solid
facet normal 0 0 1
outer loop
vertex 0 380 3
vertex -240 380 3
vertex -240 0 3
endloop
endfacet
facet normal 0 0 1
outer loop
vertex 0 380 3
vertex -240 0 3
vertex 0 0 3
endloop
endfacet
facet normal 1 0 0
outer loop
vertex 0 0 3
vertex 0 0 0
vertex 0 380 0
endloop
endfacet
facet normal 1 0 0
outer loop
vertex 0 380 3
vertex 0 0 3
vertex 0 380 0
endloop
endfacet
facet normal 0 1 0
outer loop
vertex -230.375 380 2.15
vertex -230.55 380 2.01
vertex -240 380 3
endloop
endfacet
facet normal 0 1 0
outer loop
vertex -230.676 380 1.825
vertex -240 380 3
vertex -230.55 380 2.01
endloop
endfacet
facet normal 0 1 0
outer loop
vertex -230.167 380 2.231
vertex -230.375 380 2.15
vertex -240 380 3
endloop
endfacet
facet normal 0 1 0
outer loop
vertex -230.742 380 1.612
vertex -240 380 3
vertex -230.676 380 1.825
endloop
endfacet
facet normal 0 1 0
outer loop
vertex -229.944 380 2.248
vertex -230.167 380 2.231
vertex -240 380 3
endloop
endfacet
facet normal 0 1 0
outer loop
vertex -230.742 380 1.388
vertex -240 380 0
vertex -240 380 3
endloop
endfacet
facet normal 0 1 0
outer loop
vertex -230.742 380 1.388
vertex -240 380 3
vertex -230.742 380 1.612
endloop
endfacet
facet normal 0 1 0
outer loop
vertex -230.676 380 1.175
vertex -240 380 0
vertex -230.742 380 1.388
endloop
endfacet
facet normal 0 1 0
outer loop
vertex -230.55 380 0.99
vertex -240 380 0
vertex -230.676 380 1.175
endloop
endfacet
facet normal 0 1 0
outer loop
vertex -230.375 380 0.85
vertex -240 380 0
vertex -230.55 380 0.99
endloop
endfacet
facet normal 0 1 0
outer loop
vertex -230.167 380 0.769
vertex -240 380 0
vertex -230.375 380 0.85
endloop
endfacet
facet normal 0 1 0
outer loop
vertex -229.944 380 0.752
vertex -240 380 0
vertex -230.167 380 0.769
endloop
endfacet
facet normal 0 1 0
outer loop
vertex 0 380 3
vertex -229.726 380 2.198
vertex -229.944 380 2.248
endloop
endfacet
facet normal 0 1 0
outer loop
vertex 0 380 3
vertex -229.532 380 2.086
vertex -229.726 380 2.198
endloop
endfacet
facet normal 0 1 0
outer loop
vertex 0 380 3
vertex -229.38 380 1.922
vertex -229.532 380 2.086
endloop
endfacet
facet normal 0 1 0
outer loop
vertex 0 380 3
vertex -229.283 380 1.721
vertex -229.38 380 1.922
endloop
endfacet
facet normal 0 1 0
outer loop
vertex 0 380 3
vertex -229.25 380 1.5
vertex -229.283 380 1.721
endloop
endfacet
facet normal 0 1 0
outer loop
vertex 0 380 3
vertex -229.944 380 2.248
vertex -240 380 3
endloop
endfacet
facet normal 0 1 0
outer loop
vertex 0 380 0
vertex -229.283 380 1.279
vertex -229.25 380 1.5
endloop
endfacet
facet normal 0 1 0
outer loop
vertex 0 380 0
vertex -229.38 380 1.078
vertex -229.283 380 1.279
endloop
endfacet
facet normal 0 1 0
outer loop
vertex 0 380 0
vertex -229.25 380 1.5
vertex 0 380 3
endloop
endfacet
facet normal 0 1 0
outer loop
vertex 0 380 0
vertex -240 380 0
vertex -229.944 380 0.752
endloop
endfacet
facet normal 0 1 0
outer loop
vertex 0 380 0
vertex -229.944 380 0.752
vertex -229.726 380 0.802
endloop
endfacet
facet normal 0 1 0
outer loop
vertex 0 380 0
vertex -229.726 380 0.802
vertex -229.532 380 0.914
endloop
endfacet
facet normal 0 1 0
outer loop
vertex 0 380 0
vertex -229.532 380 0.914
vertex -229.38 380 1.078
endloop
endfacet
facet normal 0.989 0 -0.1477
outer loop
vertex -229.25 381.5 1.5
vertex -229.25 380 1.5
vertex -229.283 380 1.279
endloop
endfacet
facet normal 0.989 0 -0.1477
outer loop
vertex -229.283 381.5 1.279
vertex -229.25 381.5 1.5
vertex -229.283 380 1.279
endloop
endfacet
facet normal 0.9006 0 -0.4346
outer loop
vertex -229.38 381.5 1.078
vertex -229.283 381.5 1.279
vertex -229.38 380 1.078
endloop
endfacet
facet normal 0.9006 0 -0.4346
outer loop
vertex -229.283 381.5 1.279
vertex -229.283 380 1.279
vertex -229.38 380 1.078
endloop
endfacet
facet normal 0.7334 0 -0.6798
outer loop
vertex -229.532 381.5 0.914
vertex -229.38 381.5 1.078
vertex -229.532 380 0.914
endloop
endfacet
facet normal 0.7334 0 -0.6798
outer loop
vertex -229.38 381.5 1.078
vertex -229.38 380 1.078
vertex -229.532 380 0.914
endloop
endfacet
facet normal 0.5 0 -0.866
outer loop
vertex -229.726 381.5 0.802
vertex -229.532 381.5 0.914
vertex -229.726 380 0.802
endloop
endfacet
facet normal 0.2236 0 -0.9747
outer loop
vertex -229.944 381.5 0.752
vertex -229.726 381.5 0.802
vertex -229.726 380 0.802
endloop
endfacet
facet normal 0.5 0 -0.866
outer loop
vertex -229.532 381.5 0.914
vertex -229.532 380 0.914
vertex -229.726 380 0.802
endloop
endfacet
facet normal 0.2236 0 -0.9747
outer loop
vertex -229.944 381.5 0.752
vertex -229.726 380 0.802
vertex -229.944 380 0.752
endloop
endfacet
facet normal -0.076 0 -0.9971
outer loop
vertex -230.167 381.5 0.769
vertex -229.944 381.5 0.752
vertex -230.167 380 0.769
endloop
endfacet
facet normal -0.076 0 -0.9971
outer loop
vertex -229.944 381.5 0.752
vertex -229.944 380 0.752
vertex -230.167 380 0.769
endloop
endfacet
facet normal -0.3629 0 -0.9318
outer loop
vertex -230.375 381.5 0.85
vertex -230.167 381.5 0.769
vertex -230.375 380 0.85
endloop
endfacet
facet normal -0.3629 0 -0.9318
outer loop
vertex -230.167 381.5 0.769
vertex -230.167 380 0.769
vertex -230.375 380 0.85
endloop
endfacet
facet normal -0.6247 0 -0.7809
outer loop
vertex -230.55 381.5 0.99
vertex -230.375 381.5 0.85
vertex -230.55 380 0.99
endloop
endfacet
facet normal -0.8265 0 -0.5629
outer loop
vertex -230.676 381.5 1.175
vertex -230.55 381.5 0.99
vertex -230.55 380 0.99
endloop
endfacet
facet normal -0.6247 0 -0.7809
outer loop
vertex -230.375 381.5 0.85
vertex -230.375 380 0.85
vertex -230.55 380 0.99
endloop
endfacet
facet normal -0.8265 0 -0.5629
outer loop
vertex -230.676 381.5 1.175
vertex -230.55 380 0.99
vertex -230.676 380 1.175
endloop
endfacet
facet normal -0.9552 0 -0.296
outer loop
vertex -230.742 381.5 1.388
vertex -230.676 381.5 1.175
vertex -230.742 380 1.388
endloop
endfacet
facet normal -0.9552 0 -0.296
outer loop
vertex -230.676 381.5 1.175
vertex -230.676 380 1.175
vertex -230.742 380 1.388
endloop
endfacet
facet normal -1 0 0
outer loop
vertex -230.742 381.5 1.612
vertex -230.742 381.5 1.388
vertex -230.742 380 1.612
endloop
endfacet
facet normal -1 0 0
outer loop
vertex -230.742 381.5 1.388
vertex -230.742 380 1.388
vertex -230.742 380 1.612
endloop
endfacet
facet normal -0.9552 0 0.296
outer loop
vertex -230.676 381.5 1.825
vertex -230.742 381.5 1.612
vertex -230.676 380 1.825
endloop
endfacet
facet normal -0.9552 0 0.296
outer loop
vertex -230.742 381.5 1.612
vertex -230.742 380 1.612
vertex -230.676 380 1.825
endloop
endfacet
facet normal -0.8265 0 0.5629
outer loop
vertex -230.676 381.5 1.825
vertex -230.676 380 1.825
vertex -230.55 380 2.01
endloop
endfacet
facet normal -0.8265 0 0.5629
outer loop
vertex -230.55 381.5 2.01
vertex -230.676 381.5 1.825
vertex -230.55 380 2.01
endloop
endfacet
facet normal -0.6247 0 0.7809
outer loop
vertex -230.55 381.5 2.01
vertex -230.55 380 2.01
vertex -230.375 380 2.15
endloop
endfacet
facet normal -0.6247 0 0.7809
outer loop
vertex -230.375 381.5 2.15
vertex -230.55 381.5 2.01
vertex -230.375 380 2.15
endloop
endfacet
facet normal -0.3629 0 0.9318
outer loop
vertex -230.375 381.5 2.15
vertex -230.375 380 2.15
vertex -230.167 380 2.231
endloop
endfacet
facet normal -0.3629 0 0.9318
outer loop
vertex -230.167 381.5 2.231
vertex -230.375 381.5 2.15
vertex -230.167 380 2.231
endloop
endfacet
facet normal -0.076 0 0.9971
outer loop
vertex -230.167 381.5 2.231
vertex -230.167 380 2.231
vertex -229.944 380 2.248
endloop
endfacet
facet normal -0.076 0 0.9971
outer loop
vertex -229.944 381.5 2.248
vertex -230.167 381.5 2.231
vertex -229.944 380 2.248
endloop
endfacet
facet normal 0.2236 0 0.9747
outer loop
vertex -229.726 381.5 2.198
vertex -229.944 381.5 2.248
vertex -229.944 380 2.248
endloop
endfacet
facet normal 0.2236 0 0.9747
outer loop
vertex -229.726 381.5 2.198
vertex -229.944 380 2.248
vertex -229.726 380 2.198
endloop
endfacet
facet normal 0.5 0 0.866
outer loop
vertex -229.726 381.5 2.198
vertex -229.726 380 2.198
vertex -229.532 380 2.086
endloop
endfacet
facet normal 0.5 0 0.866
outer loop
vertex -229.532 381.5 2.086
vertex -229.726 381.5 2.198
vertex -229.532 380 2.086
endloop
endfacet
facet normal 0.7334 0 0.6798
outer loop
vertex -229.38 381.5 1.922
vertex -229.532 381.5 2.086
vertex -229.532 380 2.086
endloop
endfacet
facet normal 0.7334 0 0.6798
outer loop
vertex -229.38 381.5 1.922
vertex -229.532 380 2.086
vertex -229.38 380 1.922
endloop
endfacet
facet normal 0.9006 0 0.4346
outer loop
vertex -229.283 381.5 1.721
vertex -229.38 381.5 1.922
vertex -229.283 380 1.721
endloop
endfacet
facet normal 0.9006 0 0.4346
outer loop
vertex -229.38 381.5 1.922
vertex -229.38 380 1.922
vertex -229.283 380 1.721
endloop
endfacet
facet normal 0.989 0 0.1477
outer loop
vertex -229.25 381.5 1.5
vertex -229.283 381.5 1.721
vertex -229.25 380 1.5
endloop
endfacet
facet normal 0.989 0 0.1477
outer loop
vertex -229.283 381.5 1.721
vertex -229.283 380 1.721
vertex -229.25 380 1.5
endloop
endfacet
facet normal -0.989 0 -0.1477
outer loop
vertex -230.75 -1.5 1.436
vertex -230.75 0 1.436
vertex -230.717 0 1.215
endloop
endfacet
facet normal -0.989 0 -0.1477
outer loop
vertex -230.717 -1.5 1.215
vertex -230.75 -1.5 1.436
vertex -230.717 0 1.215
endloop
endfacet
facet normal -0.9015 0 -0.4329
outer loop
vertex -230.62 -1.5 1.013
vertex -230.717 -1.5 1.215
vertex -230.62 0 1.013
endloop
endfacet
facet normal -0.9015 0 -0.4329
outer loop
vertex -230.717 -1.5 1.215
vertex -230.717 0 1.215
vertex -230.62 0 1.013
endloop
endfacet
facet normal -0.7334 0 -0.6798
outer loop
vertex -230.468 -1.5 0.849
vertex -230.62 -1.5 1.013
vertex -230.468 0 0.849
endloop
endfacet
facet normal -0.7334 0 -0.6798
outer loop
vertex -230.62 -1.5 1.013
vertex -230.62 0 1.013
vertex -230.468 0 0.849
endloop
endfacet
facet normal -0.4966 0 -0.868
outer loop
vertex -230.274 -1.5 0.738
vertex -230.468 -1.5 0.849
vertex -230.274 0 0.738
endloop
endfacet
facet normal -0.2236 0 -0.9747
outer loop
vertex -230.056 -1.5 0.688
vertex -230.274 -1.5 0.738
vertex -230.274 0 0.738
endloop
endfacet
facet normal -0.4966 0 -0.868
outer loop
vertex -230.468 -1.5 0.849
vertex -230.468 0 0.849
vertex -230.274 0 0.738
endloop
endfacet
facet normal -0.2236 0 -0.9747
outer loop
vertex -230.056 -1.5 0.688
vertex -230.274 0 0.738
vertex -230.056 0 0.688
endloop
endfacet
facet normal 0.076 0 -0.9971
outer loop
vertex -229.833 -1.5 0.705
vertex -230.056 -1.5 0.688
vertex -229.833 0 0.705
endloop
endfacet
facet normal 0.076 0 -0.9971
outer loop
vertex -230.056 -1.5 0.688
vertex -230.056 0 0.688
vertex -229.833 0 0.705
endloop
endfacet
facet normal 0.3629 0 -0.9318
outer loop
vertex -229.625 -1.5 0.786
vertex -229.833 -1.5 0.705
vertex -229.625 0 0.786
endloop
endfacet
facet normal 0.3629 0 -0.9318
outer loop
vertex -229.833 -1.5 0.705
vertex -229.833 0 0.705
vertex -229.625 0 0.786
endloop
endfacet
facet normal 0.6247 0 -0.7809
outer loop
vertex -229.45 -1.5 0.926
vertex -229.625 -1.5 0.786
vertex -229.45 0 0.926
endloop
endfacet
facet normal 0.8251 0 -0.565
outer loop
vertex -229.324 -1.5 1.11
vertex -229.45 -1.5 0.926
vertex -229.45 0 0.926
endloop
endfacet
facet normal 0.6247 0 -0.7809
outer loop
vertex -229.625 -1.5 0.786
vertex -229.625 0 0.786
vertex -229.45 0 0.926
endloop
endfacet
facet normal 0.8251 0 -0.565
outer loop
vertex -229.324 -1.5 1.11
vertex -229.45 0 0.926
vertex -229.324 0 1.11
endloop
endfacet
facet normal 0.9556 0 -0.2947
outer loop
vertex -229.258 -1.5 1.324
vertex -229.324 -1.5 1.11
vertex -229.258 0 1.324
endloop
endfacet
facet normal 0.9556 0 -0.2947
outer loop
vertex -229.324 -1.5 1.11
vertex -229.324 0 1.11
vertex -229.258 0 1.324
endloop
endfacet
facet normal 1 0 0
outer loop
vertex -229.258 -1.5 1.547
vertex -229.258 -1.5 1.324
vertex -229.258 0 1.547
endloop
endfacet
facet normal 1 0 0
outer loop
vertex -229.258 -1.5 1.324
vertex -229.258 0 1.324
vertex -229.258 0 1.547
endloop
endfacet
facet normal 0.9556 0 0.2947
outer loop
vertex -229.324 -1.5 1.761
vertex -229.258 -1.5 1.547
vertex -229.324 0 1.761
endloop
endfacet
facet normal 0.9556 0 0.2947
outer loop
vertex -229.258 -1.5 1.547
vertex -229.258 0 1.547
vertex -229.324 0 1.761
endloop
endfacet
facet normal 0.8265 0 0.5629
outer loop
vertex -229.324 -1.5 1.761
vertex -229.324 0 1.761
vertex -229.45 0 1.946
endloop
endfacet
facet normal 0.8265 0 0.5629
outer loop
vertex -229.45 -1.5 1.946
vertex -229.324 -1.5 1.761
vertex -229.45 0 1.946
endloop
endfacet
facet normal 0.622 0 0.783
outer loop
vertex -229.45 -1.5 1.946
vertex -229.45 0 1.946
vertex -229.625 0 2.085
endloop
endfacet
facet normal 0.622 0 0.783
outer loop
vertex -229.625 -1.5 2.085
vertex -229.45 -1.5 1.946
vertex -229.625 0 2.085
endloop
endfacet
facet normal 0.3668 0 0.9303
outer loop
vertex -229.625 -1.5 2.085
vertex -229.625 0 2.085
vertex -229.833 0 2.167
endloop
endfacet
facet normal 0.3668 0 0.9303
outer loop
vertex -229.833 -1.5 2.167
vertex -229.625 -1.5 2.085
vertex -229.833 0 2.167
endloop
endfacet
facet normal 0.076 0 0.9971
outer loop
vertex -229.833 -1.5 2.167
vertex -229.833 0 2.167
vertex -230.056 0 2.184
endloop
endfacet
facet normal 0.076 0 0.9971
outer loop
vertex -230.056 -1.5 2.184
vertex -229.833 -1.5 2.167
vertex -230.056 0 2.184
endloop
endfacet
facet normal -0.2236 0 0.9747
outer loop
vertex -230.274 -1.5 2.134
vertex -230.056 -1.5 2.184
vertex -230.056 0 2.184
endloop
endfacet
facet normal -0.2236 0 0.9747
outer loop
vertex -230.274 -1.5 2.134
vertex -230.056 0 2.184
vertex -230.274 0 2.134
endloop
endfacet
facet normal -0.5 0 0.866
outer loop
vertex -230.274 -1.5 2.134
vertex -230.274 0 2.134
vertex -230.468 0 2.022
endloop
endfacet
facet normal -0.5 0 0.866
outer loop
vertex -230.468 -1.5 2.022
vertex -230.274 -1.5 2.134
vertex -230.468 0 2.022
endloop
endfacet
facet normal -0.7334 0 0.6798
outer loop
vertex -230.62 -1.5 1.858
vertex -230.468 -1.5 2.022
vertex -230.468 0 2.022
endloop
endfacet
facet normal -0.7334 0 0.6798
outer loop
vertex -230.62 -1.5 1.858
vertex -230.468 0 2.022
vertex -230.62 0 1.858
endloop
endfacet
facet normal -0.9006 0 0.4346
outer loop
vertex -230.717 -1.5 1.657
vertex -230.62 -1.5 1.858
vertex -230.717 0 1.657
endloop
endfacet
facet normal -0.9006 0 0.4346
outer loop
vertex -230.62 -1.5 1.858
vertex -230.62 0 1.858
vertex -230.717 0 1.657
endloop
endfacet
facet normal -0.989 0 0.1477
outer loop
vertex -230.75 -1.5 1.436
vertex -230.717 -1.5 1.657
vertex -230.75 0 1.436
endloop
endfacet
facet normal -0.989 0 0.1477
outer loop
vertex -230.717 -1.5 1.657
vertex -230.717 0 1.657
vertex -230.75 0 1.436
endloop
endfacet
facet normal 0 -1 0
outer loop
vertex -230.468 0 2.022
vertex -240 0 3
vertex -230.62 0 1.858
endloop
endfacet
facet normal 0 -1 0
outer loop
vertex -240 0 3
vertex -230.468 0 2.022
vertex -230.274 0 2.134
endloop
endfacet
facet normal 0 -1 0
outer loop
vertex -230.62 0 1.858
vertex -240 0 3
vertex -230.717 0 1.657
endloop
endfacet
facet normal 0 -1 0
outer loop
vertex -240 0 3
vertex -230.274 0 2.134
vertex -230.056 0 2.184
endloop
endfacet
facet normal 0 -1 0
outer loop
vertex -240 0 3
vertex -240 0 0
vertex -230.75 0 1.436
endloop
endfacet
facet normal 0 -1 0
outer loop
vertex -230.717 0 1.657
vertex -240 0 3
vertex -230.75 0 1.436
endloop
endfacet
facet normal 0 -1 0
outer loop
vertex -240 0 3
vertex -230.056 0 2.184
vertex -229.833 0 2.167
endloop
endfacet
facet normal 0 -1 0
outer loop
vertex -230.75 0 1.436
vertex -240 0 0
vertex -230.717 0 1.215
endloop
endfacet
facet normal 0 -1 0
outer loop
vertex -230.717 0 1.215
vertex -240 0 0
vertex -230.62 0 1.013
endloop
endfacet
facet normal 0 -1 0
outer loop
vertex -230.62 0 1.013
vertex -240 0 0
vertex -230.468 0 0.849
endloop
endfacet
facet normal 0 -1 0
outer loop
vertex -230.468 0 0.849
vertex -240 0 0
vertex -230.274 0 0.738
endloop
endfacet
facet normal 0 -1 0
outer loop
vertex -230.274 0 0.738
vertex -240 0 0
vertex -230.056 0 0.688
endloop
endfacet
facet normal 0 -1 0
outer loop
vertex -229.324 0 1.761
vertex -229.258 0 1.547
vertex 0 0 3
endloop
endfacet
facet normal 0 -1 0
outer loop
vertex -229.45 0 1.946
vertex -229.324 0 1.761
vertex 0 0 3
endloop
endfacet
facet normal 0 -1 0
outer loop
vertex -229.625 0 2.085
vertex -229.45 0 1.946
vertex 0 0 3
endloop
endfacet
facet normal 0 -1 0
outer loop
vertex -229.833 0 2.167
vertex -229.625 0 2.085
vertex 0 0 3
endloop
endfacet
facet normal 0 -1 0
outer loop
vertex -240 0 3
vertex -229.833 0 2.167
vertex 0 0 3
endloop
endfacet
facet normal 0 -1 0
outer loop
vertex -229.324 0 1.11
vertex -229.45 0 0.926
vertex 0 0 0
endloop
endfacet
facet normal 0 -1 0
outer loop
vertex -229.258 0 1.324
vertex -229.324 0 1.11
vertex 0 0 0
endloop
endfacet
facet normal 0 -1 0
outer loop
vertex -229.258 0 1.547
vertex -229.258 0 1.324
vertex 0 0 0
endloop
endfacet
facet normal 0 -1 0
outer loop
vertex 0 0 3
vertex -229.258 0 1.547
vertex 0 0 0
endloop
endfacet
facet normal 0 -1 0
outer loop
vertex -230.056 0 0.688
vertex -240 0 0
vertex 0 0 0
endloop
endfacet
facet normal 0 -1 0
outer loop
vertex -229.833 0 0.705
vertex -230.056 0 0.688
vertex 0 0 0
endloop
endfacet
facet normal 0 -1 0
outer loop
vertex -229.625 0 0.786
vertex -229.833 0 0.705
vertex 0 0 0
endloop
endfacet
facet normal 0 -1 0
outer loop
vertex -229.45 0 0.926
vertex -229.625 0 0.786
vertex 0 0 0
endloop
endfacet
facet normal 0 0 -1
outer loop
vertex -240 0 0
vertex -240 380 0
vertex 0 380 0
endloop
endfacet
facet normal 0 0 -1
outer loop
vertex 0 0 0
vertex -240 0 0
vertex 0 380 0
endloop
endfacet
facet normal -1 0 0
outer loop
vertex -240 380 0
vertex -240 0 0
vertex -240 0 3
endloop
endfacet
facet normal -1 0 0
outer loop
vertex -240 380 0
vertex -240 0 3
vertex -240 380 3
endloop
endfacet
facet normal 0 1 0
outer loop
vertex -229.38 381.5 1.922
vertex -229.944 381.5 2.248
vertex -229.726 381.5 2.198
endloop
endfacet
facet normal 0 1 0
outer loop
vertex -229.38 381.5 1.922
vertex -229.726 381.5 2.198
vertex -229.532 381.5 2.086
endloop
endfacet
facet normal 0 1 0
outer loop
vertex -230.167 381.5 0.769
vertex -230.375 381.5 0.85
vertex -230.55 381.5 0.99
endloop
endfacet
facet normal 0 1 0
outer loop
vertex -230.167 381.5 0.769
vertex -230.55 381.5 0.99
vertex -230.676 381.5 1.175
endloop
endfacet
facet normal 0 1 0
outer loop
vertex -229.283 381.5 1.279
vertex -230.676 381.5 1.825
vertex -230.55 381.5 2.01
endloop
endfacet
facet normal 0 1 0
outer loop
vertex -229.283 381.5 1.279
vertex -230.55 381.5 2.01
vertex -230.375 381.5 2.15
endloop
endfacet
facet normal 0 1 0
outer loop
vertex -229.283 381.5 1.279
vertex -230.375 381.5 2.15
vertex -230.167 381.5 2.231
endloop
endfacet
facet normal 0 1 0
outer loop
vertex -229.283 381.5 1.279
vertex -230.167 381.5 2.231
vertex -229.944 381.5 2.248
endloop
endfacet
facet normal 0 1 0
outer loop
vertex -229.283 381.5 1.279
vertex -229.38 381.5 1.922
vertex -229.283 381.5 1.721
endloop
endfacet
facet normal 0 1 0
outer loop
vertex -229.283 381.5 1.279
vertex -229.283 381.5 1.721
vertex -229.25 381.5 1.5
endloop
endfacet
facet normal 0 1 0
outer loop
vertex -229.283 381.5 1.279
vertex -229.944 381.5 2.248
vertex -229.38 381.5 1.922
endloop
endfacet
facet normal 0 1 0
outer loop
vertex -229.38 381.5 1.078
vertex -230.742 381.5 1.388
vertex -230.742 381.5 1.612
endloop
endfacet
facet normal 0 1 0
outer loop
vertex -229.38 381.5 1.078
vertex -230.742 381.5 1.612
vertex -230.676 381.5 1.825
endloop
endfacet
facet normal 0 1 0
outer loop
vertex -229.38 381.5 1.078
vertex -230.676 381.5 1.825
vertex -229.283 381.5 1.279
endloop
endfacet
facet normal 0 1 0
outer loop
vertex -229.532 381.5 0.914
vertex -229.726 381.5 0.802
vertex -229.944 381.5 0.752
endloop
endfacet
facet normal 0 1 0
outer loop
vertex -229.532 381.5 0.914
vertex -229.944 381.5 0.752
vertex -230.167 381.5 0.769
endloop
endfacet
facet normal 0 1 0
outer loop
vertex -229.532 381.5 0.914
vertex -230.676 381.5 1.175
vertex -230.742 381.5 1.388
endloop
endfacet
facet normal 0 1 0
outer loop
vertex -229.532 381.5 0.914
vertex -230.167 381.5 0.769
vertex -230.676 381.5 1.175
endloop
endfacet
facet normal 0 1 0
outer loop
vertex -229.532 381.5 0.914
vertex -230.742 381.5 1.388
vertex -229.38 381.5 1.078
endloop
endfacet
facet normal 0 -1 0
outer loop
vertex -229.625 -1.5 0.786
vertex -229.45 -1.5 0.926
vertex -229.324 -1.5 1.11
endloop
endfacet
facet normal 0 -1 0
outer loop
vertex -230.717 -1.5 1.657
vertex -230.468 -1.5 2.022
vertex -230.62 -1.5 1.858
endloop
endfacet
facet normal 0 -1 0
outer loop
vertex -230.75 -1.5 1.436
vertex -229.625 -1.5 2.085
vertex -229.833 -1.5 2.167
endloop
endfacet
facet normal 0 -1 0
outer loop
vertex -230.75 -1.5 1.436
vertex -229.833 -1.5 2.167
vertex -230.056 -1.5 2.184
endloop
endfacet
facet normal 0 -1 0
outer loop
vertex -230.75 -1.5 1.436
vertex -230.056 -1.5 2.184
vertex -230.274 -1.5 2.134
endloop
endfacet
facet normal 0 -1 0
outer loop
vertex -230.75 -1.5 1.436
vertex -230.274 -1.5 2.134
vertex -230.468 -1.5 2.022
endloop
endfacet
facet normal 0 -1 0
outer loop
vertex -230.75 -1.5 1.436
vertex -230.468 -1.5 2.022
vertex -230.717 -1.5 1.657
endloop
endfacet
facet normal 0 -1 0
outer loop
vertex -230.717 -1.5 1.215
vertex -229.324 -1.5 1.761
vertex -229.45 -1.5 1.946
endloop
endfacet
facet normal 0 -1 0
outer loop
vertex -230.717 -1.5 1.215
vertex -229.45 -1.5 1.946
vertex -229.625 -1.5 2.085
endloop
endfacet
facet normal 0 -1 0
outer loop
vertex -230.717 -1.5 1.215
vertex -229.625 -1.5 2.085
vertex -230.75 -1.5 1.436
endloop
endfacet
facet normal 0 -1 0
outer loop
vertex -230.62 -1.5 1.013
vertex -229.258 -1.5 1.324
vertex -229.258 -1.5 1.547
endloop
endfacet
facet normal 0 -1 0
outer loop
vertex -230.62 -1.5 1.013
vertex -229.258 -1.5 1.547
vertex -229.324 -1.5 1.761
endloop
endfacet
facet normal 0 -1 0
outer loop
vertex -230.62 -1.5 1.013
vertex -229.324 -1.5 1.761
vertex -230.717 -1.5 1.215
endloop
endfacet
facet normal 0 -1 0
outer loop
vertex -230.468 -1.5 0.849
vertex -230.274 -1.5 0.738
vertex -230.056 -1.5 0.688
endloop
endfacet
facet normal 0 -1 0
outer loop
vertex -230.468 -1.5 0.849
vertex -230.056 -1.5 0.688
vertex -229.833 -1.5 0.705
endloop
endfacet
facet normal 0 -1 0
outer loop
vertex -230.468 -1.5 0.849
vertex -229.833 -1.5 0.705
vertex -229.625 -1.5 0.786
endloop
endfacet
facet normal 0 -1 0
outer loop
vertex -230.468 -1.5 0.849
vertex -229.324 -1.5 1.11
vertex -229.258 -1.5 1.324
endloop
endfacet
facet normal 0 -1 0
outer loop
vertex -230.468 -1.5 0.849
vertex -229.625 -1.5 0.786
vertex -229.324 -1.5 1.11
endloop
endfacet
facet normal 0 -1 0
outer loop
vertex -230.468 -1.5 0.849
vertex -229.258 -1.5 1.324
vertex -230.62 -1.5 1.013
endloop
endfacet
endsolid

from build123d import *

# Parameters (mm, degrees)
CROQUIS1_W              = 240
CROQUIS1_H              = 380
SALIENTE_EXTRUIR1_DEPTH = 3
CROQUIS8_R              = 0.75
SALIENTE_EXTRUIR4_DEPTH = 1.5
CROQUIS10_R             = 0.75
SALIENTE_EXTRUIR5_DEPTH = 1.5


with BuildPart() as part:
    # Croquis1 → Saliente-Extruir1 (new body)
    with BuildSketch(Plane.XY):
        with Locations((-120, 190)):
            Rectangle(CROQUIS1_W, CROQUIS1_H)
    extrude(amount=SALIENTE_EXTRUIR1_DEPTH)

    # Croquis8 → Saliente-Extruir4 (add)
    with BuildSketch(Plane(origin=(0, 0, 0), x_dir=(-1, 0, 0), z_dir=(0, -1, 0))):
        with Locations((230, -1.435696055)):
            Circle(CROQUIS8_R)
    extrude(amount=SALIENTE_EXTRUIR4_DEPTH)

    # Croquis10 → Saliente-Extruir5 (add)
    with BuildSketch(Plane(origin=(0, 380, 0), x_dir=(1, 0, 0), z_dir=(0, 1, 0))):
        with Locations((-230, -1.5)):
            Circle(CROQUIS10_R)
    extrude(amount=SALIENTE_EXTRUIR5_DEPTH)


solid = part.part
